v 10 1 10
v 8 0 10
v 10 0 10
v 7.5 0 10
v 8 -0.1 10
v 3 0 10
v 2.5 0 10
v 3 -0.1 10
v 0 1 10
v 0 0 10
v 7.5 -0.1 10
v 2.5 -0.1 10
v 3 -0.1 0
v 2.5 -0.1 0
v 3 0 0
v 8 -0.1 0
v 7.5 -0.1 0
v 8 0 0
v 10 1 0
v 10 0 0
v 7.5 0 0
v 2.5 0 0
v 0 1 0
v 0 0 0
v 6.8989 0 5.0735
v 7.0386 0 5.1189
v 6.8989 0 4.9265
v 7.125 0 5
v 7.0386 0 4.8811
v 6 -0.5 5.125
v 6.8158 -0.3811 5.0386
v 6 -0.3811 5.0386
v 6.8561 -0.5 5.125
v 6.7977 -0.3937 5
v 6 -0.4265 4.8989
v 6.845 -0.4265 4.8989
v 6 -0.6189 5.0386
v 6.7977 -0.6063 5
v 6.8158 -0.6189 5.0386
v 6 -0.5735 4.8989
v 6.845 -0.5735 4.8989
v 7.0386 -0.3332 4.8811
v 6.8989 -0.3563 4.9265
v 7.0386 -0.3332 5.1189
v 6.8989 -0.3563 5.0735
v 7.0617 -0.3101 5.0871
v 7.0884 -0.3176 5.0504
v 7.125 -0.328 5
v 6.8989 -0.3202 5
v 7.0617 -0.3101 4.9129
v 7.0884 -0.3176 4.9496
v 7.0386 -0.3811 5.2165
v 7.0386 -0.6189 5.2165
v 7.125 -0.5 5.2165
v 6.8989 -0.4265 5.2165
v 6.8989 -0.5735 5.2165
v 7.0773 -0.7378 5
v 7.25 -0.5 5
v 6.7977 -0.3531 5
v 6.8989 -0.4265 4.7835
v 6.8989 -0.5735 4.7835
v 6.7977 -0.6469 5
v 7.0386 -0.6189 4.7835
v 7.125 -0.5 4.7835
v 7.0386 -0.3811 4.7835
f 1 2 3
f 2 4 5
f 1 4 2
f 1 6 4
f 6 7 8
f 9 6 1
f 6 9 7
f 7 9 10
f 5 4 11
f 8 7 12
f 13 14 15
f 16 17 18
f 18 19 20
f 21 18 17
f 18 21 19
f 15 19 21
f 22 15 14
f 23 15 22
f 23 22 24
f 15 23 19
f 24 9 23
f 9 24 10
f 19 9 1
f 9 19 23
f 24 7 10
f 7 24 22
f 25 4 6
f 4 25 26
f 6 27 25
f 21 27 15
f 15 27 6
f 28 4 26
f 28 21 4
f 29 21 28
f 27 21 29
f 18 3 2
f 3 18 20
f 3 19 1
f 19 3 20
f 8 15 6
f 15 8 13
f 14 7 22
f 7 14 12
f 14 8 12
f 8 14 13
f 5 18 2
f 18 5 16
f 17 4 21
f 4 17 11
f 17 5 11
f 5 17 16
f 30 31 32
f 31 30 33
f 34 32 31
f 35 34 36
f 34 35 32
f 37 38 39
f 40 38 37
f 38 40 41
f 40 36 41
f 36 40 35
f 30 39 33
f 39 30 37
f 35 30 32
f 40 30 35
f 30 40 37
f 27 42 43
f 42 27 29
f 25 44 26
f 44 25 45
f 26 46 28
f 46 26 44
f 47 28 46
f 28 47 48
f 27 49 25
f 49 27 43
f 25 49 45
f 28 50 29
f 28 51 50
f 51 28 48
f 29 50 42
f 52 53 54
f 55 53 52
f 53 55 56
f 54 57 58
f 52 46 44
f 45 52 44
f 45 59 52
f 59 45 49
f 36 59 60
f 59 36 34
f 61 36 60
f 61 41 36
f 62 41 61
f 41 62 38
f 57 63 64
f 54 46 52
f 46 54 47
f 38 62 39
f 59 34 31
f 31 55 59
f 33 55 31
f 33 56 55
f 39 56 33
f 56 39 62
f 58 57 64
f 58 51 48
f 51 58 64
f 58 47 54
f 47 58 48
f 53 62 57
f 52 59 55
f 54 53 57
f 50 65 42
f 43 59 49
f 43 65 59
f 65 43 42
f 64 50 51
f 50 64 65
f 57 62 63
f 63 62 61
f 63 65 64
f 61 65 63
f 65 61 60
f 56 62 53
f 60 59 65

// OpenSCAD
//Call function
door(10);


// Door module that brings together all elements
module door(cube_size) {
    // dimensions
    width = cube_size/2; 
    height = 10;
    thick = 1;
    x = 1;
    y = thick;
    z = cube_size/10;
    sca = (cube_size/200)*5; //scaling for handle varying w cube_size
    handlex = 9*(cube_size/20); //handle translations according to cube_size
    handley = 0;
    handlez = 10*(cube_size/20); 
    union(){
        scale([x, y, z]){
            cube([width, thick, height]);
            translate([width,0,0]){
                cube([width, thick, height]);
            }
            translate([0,0,0]){
                cube([width/2, thick, height]);
            }
            translate([width/2,-0.1,0]){
                cube([0.5, thick, height]);
            }
            translate([width+width/2,-0.1,0]){
                cube([0.5, thick, height]);
            }
        }
        translate([handlex+(width/2),handley,handlez]){
            scale([sca,sca,sca]){
                handle();
                round_knob();
            }
        }
    }
}
//********* End of Module ***********


module round_knob() {
    translate([0,-2,0])
        sphere(d=2);
    rotate([90,0,0])
        cylinder(d=1, h=2);
}
//********* End of Module ***********


module handle() {
    rotate([90,0,0])
        cylinder(d=1, h=2);
    translate([0,-2,0]) {
        rotate([0,-90,0])
            cylinder(d=1, h=4);
        sphere(d=1);
    }
}
//********* End of Module ***********
